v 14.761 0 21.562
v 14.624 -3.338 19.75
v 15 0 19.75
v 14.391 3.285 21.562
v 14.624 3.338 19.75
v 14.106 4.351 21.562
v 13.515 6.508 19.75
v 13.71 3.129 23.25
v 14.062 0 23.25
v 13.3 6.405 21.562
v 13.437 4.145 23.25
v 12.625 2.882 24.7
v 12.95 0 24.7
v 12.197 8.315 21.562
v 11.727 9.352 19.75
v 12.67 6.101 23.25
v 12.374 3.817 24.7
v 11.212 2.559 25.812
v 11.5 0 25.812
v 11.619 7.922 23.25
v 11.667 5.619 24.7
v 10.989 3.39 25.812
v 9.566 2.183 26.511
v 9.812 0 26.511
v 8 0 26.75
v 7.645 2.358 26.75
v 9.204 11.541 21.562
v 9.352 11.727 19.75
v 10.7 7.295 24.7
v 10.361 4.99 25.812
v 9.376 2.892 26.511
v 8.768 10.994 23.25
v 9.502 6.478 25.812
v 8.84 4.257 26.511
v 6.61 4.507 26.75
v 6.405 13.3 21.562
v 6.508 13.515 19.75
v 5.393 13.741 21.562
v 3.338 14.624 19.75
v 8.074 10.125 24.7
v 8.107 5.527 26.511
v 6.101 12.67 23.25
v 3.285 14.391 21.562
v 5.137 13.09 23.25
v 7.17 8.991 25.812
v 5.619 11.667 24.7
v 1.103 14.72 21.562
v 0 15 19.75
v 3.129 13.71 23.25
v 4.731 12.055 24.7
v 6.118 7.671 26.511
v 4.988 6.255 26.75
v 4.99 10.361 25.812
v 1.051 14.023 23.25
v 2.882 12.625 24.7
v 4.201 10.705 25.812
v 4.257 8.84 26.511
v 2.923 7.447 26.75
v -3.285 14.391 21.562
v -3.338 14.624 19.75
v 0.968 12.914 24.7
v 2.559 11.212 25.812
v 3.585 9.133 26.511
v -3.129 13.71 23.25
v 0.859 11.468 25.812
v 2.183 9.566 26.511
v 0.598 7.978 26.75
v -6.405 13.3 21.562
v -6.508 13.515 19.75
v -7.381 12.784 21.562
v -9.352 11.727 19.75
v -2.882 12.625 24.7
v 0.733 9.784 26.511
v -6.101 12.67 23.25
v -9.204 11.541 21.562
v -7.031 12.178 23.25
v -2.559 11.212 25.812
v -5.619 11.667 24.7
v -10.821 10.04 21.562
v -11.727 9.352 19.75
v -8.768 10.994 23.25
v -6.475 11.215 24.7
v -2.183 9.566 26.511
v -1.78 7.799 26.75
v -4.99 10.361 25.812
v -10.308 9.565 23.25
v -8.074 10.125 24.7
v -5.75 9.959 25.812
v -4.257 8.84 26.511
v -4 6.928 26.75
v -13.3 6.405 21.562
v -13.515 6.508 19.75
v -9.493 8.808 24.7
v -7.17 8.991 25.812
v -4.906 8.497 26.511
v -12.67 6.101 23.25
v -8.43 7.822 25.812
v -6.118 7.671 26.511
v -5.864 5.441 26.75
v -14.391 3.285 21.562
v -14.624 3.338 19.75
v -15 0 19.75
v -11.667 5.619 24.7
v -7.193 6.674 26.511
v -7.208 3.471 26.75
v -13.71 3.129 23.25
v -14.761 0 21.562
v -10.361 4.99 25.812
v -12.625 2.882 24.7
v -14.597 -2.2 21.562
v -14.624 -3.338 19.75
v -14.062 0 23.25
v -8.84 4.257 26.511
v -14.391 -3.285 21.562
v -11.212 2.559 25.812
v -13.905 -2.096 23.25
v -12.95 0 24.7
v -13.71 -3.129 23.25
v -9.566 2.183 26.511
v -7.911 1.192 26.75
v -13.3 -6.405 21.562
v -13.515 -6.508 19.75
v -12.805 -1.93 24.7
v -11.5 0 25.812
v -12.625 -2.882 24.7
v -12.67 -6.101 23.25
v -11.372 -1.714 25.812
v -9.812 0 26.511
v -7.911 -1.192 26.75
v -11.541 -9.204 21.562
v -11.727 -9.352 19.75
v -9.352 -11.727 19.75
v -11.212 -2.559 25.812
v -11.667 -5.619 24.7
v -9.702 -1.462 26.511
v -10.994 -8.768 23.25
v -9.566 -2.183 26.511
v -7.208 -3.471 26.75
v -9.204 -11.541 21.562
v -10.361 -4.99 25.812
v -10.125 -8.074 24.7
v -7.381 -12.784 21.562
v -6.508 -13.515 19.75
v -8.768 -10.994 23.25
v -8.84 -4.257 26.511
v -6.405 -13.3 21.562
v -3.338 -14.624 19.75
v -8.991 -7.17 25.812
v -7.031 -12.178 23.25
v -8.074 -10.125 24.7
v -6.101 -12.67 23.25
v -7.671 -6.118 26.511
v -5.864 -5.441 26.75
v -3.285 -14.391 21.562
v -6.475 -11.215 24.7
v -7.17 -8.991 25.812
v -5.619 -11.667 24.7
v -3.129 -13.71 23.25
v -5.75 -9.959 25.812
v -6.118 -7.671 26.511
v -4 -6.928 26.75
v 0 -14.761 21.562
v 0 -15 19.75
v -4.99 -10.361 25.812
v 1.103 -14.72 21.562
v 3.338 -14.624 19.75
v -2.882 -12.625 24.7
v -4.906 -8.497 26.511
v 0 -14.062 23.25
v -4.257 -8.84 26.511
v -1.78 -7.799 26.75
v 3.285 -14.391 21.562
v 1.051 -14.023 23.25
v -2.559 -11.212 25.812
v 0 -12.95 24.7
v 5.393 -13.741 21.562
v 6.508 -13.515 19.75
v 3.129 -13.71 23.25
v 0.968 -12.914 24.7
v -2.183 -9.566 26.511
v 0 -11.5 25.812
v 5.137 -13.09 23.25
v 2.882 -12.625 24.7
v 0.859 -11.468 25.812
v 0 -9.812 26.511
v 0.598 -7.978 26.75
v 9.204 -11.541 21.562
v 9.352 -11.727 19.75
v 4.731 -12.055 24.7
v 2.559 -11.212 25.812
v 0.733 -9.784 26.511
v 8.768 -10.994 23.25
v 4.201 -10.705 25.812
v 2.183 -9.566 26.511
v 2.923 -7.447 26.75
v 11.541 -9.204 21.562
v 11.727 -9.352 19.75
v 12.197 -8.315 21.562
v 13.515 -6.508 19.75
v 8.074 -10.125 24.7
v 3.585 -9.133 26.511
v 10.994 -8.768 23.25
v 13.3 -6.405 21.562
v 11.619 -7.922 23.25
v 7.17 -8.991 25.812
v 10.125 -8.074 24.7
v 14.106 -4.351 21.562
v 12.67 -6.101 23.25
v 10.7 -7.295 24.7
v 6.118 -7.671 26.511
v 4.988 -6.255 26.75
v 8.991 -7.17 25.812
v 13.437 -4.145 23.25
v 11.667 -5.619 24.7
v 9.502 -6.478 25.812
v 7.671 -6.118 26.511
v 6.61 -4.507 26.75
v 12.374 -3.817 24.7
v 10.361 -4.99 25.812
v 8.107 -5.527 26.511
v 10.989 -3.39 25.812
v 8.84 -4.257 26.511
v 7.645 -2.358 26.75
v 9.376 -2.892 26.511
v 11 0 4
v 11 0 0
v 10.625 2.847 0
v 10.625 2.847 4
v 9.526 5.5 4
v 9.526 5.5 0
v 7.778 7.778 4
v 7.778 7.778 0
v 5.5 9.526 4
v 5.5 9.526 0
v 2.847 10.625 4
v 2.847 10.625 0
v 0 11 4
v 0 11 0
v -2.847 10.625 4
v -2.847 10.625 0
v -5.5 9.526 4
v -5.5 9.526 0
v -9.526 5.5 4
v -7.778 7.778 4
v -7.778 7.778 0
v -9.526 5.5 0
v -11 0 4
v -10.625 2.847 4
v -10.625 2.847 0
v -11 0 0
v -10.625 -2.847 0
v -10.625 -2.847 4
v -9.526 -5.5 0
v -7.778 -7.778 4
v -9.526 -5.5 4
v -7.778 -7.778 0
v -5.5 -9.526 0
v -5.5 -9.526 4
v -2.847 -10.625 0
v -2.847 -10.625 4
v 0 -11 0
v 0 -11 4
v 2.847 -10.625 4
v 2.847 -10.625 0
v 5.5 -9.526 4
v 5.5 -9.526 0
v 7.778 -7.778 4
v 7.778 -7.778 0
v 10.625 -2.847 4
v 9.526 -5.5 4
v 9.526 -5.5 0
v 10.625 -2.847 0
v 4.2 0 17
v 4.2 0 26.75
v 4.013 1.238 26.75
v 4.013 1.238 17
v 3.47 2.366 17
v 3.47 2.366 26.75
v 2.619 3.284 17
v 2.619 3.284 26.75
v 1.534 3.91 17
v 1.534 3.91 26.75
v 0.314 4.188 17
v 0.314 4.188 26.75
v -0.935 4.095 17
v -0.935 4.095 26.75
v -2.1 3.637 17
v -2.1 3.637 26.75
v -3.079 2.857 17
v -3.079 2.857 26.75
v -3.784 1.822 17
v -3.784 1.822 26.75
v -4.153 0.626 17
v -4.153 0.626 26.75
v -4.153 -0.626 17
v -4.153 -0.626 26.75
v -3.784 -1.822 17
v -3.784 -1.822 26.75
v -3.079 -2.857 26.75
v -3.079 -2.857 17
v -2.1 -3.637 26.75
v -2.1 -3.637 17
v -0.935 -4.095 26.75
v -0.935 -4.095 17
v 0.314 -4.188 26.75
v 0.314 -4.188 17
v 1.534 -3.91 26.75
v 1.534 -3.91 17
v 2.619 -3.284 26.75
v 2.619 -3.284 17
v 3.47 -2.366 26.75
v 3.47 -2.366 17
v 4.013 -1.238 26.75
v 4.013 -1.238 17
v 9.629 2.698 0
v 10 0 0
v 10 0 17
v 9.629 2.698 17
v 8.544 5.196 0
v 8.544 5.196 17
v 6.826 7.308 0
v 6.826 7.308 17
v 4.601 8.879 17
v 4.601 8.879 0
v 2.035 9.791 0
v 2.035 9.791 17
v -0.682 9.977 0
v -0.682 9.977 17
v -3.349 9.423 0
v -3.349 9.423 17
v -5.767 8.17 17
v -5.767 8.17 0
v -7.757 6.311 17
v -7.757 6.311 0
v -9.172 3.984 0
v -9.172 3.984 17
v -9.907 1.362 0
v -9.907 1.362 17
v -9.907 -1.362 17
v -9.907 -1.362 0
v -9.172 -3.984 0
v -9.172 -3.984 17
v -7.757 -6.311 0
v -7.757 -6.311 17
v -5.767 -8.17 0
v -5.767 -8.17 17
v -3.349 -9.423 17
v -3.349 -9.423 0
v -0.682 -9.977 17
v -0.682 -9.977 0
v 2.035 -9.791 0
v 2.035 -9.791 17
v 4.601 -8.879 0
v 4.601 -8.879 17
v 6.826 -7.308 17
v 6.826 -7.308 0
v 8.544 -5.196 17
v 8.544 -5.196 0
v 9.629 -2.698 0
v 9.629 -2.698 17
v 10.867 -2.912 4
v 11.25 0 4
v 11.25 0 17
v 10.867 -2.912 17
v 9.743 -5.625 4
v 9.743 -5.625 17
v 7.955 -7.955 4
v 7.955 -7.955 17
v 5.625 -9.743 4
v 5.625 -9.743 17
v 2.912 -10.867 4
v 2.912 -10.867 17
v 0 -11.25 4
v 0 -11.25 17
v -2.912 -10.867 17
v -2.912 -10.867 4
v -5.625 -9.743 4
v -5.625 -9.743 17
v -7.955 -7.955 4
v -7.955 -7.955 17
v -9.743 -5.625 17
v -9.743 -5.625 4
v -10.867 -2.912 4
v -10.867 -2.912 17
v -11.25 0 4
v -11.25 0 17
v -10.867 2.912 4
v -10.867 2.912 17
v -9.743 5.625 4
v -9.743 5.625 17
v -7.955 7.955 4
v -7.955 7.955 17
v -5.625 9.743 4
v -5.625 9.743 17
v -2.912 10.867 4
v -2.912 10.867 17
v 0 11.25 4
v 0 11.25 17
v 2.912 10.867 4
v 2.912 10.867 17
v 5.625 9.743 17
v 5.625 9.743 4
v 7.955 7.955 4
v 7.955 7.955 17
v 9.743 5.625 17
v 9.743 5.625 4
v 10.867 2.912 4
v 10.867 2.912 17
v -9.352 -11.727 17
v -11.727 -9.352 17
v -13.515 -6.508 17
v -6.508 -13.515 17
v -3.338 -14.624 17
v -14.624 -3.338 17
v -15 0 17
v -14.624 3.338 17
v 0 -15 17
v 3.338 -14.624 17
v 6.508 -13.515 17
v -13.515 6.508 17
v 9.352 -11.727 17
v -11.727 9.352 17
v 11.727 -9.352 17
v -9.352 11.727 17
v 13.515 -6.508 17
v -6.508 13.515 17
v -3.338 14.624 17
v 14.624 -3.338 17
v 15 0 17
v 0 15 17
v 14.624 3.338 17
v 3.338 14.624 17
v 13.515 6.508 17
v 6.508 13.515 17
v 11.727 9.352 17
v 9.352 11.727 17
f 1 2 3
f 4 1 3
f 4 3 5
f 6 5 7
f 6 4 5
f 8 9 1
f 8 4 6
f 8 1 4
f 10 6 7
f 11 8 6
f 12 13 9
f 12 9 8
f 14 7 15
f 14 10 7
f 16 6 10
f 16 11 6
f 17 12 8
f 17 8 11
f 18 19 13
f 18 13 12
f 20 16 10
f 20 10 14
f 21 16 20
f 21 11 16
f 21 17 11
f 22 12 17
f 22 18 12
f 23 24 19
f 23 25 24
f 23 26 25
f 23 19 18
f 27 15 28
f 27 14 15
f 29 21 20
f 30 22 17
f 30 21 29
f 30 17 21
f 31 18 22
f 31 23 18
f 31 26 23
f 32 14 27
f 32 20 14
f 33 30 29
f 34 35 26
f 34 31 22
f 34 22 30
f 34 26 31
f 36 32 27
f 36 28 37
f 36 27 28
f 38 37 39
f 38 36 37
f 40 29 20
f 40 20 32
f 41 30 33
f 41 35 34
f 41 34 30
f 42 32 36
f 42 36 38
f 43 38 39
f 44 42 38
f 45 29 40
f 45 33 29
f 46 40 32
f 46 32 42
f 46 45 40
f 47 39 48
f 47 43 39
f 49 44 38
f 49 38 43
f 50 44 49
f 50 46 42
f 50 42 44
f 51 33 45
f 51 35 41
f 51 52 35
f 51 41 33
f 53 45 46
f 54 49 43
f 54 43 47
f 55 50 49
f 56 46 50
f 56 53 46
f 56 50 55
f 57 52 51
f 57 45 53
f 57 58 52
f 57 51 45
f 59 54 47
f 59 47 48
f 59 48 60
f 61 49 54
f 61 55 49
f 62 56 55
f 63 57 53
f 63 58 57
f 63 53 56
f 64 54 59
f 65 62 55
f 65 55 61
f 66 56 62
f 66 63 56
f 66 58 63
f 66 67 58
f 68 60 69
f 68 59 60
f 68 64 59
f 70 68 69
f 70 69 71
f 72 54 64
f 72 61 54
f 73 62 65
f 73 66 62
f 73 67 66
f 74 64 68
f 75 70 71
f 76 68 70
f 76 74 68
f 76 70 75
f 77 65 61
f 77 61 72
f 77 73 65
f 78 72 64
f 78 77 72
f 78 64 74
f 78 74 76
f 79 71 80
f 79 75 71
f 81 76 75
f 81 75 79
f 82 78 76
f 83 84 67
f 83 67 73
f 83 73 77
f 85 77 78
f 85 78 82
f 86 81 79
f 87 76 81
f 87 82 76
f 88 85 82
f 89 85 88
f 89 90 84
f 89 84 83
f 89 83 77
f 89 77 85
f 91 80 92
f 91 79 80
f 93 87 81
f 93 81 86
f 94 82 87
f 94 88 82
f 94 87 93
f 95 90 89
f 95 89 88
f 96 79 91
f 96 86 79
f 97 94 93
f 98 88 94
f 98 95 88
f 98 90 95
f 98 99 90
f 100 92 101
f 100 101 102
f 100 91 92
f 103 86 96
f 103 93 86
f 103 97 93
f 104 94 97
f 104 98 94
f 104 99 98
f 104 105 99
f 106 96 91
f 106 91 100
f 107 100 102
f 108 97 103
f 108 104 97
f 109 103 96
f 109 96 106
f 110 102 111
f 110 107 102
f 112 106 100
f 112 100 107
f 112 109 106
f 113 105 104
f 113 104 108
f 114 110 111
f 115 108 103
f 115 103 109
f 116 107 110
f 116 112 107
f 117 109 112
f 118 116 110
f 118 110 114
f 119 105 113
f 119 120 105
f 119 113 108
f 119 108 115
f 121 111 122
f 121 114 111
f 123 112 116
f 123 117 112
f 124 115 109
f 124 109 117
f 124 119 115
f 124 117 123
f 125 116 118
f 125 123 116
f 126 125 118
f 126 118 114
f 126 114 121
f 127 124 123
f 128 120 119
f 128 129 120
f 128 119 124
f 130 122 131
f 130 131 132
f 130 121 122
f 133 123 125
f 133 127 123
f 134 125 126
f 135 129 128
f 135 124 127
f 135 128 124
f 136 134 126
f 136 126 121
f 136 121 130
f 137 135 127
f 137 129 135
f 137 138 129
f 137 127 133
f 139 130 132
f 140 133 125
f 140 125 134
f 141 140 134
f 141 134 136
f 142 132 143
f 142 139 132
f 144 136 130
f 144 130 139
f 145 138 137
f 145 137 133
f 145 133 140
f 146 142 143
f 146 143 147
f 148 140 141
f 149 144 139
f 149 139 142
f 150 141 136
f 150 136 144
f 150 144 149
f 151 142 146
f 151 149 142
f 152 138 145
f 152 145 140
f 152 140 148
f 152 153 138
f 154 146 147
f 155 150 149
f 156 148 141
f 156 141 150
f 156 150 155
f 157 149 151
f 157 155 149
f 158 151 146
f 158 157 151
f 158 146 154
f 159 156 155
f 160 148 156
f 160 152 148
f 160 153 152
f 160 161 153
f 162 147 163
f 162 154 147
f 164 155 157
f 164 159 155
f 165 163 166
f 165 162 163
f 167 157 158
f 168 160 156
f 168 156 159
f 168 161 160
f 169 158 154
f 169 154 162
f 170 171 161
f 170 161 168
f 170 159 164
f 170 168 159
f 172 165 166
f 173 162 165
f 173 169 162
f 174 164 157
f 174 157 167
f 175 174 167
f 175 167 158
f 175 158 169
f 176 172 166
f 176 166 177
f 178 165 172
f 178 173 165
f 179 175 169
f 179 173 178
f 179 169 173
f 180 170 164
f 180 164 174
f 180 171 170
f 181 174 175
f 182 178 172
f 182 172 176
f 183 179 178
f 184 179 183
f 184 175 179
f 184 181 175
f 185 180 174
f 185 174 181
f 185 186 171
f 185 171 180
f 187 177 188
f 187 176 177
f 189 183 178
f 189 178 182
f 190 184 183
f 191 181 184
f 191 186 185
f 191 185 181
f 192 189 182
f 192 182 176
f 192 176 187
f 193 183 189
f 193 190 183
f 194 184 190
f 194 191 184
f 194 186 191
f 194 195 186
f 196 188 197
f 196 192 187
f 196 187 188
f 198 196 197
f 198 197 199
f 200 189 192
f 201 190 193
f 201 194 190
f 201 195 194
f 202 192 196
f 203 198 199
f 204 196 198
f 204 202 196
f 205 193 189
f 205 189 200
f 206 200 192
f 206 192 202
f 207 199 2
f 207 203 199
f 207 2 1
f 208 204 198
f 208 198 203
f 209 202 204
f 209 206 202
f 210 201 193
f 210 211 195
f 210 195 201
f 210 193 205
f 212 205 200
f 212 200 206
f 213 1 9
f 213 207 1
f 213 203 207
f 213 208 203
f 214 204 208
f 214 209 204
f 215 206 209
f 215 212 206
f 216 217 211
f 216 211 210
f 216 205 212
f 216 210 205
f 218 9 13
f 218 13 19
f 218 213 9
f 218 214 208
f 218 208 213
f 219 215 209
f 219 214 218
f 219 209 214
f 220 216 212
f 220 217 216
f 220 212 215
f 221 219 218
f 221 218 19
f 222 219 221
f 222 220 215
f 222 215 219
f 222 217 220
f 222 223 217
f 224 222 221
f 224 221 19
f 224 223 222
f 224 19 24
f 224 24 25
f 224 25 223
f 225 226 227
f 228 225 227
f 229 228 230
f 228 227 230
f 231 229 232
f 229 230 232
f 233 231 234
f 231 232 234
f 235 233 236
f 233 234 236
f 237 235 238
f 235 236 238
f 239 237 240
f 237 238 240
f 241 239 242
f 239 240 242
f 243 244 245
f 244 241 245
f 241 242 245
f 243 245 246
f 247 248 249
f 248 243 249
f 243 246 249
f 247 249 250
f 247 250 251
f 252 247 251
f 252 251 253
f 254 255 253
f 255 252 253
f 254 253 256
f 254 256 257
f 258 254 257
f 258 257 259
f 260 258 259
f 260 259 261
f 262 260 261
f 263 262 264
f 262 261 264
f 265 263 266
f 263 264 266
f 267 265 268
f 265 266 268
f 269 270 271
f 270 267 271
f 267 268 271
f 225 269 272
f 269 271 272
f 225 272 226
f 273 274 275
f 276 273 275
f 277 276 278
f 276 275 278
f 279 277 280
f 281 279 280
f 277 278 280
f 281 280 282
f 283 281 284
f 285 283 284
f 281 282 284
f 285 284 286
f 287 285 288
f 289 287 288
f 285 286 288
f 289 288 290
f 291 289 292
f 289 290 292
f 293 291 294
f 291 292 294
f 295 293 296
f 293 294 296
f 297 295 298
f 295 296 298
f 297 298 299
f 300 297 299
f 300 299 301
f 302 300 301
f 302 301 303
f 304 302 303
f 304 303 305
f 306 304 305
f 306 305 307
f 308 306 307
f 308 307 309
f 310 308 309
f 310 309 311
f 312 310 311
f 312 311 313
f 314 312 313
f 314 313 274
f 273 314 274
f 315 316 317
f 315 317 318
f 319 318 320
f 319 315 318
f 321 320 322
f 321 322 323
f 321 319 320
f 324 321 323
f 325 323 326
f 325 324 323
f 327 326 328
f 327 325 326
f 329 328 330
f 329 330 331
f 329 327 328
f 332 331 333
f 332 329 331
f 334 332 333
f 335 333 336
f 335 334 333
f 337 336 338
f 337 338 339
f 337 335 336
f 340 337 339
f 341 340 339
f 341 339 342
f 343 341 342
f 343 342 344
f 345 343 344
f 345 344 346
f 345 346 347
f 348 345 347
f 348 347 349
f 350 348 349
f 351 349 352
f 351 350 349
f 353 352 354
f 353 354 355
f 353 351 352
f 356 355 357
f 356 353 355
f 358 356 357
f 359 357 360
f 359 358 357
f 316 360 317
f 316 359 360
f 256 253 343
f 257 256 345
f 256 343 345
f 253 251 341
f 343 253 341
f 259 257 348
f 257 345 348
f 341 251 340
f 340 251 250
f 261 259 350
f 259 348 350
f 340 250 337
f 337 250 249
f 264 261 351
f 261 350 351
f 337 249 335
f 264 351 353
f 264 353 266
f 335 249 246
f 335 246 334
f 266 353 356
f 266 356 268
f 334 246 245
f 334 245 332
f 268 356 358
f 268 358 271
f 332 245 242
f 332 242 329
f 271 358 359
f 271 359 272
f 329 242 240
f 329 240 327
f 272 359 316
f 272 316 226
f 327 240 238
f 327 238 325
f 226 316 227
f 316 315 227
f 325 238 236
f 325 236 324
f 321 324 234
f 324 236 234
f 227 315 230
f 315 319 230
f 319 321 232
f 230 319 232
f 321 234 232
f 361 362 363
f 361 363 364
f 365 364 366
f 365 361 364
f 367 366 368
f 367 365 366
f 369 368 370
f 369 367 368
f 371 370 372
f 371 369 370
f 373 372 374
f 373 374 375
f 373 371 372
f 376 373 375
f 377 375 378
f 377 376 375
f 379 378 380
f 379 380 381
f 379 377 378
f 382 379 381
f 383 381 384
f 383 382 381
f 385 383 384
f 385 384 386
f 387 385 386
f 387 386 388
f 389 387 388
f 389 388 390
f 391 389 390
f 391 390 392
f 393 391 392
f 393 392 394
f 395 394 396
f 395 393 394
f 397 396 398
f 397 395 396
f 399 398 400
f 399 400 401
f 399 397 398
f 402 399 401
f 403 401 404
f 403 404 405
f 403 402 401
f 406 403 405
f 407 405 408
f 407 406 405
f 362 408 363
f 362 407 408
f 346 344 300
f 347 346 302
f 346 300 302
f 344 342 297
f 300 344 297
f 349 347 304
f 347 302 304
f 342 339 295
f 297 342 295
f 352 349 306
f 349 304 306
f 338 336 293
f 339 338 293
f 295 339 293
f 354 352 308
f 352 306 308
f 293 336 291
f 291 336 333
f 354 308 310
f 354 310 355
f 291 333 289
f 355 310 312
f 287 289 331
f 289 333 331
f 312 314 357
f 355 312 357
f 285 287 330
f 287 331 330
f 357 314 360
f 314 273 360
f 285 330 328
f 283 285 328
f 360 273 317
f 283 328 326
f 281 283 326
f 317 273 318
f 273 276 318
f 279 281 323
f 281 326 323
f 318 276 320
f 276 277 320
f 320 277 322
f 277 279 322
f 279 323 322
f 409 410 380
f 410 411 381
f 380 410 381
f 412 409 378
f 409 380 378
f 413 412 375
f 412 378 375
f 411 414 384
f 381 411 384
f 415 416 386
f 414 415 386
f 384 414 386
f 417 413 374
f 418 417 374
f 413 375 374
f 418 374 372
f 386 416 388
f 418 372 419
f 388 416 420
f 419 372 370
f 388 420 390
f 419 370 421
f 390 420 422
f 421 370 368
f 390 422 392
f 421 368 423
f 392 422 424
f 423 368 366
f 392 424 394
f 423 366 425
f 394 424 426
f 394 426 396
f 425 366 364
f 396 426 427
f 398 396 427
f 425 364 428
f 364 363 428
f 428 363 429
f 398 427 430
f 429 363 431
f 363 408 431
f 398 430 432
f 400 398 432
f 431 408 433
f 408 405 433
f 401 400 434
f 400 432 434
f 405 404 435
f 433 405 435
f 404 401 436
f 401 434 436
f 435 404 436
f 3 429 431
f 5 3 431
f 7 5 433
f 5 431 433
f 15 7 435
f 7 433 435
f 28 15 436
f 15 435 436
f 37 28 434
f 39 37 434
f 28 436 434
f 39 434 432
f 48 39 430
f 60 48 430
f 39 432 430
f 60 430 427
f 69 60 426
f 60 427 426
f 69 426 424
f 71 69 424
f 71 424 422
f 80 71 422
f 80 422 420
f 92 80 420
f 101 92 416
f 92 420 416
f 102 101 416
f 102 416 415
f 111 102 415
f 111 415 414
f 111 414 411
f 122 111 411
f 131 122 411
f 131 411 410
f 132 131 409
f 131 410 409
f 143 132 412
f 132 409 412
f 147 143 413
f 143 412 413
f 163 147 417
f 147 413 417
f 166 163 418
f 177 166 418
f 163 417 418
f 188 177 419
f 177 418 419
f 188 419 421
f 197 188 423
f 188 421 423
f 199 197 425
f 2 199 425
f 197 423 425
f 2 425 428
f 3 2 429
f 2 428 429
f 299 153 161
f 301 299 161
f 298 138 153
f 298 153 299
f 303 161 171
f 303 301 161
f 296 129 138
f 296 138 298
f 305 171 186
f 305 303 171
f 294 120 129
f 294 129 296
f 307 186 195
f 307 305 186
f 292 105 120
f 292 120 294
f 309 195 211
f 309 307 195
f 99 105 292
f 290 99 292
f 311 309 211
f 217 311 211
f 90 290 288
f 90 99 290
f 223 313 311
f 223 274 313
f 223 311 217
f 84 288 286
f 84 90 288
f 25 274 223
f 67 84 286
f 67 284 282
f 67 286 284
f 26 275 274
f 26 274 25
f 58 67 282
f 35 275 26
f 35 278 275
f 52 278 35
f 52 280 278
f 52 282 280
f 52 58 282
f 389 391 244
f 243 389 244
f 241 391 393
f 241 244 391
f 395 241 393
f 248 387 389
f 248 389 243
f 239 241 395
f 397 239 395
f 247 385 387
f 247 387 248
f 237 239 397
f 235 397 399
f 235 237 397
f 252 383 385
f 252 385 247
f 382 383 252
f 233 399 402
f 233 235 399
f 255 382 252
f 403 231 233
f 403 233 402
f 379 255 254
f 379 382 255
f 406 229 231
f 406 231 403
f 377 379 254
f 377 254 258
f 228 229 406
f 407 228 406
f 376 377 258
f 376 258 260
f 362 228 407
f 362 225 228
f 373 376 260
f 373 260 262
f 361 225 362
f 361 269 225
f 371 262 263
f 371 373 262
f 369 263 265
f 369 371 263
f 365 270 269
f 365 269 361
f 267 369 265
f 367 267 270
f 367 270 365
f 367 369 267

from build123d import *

# Parameters (mm, degrees)
F0_R     = 11
F0_R_2   = 10
F1_DEPTH = 17
F2_R     = 15
F3_DEPTH = 9.75
F4_R     = 7
F6_R     = 11.25
F6_R_2   = 11
F7_DEPTH = 13
F8_R     = 4.2
F9_DEPTH = 25.4


with BuildPart() as f1:
    # F0 (on Top) → F1 (new body)
    with BuildSketch(Plane.XY):
        Circle(F0_R)
        Circle(F0_R_2, mode=Mode.SUBTRACT)
    extrude(amount=F1_DEPTH)

    # F2 (on face) → F3 (join)
    with BuildSketch(Plane.XY.offset(17)):
        Circle(F2_R)
    extrude(amount=F3_DEPTH)

    # F4
    f4_edges = [f1.edges().sort_by_distance(p)[0] for p in [
        (-15, 0, 26.75),
    ]]
    fillet(f4_edges, radius=F4_R)

    # F6 (on offset) → F7 (join, through all)
    with BuildSketch(Plane(origin=(0, 0, 4), x_dir=(1, 0, 0), z_dir=(0, 0, -1))):
        Circle(F6_R)
        Circle(F6_R_2, mode=Mode.SUBTRACT)
    extrude(amount=-F7_DEPTH)

    # F8 (on face) → F9 (cut)
    with BuildSketch(Plane.XY.offset(26.75)):
        Circle(F8_R)
    extrude(amount=-F9_DEPTH, mode=Mode.SUBTRACT)


solid = f1.part
